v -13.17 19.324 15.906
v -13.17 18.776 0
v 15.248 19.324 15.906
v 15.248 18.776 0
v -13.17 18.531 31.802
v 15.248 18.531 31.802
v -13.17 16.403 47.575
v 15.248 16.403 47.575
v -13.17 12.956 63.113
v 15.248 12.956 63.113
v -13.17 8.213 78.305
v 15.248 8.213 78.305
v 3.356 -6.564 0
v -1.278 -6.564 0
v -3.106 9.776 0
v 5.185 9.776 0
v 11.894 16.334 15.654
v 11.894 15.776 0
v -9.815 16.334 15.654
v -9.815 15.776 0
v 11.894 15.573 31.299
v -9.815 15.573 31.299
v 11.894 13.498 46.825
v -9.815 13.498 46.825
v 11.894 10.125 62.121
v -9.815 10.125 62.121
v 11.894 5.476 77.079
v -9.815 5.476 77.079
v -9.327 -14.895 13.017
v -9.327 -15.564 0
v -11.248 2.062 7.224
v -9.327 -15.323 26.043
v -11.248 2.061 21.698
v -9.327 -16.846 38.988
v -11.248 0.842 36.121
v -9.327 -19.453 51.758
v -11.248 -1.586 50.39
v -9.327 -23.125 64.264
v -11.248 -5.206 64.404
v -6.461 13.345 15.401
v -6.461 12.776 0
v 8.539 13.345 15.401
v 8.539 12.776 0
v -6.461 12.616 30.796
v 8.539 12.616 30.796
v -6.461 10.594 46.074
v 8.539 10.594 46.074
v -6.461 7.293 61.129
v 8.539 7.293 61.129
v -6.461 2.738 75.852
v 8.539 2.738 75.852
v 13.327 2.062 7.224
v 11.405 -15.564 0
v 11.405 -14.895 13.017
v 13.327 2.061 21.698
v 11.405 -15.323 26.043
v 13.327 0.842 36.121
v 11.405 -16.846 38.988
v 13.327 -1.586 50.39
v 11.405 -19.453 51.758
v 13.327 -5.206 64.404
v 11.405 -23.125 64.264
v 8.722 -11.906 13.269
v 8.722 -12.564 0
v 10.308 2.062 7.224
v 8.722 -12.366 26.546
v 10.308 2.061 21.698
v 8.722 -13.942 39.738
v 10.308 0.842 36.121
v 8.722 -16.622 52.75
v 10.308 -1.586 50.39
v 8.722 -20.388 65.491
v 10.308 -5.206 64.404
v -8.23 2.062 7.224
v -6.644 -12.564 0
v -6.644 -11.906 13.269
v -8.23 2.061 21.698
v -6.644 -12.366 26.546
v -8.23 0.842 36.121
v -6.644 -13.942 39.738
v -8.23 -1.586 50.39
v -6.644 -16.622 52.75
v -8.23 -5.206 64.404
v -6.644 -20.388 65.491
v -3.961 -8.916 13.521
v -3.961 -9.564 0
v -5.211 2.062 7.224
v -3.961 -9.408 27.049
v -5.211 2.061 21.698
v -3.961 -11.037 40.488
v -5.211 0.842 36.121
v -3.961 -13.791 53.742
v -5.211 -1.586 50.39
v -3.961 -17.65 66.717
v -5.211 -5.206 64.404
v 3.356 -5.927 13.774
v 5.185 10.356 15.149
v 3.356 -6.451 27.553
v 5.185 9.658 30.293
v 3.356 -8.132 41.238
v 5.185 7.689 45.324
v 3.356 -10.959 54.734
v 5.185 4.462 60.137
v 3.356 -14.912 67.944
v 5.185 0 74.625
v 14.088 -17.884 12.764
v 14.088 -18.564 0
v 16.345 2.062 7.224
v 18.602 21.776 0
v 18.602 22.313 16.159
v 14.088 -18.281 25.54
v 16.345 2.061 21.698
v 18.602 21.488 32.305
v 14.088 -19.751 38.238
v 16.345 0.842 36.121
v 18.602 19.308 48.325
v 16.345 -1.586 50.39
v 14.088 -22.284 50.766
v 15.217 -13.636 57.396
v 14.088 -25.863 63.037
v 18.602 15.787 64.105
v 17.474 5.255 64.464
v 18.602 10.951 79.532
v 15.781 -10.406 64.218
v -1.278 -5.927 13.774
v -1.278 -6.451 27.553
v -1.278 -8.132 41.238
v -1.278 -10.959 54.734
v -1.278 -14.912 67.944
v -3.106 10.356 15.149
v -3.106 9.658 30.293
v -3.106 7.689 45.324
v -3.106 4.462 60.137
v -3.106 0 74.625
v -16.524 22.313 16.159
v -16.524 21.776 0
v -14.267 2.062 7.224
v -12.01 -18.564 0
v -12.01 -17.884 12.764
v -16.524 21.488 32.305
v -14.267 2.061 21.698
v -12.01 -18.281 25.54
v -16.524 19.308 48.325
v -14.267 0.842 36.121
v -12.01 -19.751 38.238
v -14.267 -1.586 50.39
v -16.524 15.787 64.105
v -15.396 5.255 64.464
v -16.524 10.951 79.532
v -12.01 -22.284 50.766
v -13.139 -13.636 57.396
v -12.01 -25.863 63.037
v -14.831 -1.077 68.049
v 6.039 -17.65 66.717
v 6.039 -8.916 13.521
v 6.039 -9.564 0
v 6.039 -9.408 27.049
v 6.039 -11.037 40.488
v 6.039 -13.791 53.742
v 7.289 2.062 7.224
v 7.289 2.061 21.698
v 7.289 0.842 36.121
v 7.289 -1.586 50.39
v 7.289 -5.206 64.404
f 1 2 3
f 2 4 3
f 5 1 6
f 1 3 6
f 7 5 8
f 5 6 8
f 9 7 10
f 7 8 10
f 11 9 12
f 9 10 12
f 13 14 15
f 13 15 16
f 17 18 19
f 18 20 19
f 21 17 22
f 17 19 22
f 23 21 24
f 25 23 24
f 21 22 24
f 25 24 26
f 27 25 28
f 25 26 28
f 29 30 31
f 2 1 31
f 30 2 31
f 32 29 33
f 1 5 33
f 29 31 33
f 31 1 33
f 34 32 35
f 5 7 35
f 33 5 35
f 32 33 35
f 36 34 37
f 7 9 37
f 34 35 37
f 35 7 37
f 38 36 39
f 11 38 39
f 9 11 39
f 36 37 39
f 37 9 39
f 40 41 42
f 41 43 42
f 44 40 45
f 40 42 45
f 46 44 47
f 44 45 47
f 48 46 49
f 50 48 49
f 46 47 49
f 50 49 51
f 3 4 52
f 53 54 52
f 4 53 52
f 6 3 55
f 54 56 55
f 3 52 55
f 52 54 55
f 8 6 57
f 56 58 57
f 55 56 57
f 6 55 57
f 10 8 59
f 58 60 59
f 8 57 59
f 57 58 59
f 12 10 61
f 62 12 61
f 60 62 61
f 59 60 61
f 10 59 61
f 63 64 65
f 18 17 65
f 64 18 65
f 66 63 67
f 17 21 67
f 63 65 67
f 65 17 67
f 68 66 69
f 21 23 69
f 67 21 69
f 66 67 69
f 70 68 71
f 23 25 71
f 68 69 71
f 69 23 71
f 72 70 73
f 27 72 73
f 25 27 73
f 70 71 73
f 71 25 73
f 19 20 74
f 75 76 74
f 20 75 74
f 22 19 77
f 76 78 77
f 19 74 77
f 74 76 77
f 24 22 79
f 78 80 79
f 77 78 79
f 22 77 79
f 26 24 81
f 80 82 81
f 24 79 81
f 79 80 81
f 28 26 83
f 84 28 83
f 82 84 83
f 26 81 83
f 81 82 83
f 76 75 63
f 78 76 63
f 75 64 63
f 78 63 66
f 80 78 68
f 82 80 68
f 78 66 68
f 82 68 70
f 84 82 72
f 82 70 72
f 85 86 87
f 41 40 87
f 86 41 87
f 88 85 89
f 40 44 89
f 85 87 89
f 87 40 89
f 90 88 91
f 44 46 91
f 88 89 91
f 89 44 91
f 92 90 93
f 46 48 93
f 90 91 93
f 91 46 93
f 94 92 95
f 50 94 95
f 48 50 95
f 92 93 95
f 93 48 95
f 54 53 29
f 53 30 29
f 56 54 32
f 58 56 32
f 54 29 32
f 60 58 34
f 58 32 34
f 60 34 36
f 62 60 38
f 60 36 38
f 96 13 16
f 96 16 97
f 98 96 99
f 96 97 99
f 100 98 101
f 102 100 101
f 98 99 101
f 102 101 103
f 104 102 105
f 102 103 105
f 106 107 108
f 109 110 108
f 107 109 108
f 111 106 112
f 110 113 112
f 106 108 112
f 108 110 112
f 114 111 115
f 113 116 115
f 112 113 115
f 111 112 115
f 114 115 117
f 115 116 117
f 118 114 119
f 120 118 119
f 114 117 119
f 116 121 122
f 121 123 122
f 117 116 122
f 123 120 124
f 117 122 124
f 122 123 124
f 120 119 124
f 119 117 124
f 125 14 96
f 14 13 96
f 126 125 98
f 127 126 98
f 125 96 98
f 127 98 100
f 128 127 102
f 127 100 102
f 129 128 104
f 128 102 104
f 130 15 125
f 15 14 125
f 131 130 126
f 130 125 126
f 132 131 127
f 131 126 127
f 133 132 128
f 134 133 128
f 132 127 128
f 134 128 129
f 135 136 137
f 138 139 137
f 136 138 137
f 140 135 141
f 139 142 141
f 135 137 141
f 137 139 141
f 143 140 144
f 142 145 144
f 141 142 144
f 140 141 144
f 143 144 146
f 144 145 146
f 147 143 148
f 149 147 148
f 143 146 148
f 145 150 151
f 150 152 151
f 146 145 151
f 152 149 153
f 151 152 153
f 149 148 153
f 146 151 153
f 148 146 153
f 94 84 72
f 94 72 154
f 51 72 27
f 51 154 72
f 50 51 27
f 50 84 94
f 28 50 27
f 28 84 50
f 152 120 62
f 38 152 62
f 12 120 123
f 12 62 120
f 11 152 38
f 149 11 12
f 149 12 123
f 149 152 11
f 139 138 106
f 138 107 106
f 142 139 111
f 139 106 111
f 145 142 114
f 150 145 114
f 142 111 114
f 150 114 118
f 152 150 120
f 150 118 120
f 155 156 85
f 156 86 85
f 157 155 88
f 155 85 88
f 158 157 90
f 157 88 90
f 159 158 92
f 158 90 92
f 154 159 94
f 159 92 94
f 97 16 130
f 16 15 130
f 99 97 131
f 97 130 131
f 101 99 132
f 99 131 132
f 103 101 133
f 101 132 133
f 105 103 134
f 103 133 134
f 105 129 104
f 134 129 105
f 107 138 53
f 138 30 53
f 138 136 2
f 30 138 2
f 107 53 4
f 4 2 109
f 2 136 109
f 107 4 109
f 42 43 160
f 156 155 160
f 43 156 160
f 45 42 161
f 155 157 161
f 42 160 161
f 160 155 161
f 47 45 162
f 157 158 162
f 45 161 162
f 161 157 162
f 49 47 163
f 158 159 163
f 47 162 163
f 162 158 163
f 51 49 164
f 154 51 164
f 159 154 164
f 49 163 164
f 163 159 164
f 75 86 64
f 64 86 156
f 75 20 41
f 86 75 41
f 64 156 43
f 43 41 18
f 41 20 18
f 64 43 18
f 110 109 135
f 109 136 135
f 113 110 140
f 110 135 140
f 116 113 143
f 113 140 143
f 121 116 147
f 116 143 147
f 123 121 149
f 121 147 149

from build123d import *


with BuildPart() as f2:
    # F2: sweep along a path in F1
    with BuildLine(Plane.YZ) as f2_path:
        ThreePointArc((9.7761358373, 0), (8.8319964441, 37.8292788096), (0, 74.625223875))
    # F0 (on Top) → F2 (sweep)
    with BuildSketch(Plane.XY):
        Polygon((14.0881141583, -18.5642899235), (18.6023998519, 21.7761358373), (-16.524239274, 21.7761358373), (-12.0099535803, -18.5642899235), align=None)
        Polygon((-13.1697994197, 18.7761358373), (15.2479599976, 18.7761358373), (11.4051028685, -15.5642899235), (-9.3269422906, -15.5642899235), align=None, mode=Mode.SUBTRACT)
        Polygon((8.7220915787, -12.5642899235), (11.8935201433, 15.7761358373), (-9.8153595654, 15.7761358373), (-6.6439310008, -12.5642899235), align=None)
        Polygon((-3.960919711, -9.5642899235), (-6.460919711, 12.7761358373), (8.539080289, 12.7761358373), (6.039080289, -9.5642899235), align=None, mode=Mode.SUBTRACT)
        Polygon((3.3560689992, -6.5642899235), (5.1846404346, 9.7761358373), (-3.1064798567, 9.7761358373), (-1.2779084213, -6.5642899235), align=None)
    sweep(path=f2_path.line)


solid = f2.part
